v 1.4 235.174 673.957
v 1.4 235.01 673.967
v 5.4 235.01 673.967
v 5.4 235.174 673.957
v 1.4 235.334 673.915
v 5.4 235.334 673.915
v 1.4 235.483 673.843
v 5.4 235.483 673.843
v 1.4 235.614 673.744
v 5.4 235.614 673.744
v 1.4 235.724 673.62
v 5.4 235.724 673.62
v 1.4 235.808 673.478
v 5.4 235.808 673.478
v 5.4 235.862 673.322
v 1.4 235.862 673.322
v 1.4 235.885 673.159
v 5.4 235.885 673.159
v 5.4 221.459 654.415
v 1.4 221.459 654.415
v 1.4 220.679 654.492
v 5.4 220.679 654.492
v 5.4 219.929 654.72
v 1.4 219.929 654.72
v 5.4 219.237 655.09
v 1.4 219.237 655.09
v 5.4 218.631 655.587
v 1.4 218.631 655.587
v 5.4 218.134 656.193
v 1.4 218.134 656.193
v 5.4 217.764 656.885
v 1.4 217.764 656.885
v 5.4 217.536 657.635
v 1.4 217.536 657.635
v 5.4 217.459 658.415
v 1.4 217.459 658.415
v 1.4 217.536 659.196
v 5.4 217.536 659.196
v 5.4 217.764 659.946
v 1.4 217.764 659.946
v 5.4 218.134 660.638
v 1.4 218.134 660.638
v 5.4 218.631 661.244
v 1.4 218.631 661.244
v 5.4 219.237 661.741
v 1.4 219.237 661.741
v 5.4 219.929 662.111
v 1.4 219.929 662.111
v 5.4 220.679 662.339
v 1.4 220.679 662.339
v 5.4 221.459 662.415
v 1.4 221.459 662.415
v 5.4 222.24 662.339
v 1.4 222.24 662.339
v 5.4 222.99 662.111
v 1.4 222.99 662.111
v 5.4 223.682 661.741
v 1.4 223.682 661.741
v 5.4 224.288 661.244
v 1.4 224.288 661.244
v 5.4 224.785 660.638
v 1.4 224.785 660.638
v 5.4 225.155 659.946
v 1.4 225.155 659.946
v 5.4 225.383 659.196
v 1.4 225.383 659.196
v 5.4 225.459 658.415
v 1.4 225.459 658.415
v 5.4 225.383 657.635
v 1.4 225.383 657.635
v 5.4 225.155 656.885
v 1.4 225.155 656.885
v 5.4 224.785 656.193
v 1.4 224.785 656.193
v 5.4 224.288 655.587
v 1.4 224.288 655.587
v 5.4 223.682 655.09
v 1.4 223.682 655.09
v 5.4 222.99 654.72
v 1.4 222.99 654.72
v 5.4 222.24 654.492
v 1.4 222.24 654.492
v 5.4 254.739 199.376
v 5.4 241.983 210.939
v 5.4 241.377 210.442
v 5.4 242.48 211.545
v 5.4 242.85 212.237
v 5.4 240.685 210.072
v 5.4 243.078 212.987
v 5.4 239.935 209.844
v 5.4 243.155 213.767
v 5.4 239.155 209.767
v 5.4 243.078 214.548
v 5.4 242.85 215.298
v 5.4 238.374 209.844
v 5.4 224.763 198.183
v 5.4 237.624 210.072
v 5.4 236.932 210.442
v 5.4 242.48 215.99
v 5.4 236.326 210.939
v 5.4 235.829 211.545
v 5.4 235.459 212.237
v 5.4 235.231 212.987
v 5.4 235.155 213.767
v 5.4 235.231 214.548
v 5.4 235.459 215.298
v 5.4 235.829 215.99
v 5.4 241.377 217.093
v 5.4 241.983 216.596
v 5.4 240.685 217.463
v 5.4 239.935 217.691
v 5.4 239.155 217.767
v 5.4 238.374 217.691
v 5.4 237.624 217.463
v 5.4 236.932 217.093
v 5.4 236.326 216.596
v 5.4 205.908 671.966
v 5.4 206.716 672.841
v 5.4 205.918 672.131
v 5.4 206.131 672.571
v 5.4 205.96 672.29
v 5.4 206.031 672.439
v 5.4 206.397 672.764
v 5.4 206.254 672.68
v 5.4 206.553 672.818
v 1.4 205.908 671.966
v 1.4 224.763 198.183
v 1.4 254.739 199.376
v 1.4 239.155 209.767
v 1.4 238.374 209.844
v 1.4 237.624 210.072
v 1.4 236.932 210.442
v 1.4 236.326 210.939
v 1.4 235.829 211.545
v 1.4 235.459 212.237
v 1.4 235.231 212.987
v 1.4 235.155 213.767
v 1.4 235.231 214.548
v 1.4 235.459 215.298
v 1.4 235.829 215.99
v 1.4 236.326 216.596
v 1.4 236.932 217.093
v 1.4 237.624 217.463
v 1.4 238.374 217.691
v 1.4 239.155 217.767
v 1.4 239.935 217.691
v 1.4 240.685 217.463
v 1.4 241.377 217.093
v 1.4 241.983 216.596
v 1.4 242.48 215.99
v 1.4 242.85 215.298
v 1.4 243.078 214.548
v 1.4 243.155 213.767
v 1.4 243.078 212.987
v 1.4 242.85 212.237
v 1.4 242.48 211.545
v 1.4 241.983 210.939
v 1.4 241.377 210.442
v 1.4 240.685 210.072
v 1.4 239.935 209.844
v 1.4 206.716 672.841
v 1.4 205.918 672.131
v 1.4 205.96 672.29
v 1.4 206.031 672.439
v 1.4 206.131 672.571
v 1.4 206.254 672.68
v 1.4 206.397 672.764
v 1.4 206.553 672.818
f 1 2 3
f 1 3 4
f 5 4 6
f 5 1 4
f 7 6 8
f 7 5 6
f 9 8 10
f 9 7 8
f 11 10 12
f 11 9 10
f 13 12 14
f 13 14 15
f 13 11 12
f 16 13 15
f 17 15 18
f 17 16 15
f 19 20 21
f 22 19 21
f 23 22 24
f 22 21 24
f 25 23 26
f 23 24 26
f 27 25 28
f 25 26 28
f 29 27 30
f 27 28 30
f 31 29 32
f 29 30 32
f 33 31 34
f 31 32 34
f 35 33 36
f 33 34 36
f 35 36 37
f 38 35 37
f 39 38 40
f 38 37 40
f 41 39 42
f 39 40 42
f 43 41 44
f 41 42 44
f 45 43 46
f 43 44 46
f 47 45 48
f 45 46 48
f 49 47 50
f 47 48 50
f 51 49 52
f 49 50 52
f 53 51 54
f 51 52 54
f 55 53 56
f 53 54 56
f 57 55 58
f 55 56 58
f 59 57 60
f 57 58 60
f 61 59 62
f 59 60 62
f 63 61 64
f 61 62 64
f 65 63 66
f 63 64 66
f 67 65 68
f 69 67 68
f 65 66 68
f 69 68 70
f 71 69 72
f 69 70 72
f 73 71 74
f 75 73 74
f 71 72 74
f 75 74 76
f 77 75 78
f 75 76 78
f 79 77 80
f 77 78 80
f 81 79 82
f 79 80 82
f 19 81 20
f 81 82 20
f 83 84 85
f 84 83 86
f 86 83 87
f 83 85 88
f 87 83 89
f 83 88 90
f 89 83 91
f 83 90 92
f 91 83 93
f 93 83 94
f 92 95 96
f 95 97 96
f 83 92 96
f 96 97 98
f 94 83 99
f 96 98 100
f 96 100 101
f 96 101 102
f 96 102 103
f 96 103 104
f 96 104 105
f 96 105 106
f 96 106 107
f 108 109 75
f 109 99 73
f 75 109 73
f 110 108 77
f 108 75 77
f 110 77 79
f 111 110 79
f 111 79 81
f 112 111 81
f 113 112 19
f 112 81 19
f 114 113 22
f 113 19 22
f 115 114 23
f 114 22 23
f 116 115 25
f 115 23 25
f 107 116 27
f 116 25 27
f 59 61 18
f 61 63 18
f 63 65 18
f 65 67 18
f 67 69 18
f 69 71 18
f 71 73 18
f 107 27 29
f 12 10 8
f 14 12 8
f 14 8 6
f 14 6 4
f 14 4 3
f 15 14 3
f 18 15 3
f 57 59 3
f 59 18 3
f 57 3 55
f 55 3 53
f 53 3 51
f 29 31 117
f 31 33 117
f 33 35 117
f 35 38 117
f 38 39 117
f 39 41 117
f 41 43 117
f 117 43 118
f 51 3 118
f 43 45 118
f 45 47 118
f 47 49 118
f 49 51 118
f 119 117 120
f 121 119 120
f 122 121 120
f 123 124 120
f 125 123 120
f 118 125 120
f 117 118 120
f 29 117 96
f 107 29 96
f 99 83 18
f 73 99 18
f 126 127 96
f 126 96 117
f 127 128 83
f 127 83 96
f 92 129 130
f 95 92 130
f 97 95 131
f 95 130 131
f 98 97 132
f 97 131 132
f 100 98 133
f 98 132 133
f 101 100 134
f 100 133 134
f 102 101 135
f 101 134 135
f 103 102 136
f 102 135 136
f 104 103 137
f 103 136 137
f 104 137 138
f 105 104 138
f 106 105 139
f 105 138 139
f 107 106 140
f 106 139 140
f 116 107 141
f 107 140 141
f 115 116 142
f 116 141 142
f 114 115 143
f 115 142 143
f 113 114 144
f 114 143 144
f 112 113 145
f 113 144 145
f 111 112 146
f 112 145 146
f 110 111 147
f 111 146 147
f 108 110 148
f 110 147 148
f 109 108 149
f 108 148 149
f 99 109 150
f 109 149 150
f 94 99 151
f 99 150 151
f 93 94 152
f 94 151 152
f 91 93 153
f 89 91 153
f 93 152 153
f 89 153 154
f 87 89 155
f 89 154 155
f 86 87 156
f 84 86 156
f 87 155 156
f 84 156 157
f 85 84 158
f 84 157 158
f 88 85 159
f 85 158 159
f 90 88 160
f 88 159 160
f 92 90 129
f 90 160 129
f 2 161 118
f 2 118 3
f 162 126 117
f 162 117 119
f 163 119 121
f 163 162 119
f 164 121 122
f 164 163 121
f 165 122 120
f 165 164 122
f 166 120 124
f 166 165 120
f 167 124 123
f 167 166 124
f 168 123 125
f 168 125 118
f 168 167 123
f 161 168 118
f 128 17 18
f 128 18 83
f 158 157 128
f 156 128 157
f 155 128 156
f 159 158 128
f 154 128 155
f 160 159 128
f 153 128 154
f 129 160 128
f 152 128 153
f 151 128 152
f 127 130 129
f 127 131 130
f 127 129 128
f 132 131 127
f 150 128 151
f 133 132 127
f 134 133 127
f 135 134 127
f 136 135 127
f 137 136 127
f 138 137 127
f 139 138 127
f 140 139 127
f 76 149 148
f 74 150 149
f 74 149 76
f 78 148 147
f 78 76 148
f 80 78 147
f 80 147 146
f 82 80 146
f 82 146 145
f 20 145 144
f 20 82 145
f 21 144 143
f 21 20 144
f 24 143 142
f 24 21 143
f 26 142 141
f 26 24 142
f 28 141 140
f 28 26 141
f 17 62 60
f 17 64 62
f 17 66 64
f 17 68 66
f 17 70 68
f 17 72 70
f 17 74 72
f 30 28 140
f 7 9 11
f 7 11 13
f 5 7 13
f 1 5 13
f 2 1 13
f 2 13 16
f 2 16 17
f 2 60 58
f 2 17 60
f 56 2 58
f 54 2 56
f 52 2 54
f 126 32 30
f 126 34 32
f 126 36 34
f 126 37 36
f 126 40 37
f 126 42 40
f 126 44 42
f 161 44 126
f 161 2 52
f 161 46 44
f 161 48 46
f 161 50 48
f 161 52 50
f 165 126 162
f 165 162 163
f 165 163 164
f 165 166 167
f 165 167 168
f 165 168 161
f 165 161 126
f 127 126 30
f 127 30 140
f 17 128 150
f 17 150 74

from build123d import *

# Parameters (mm, degrees)
SKETCH1_R           = 4
BOSS_EXTRUDE1_DEPTH = 4


with BuildPart() as part:
    # Sketch1 → Boss-Extrude1 (new body)
    with BuildSketch(Plane(origin=(1.4, 0, 0), x_dir=(0, -1, 0), z_dir=(-1, 0, 0))):
        with BuildLine():
            Line((-254.739115199, 199.375774934), (-224.762842625, 198.182844675))
            Line((-224.762842625, 198.182844675), (-205.908265943, 671.965721187))
            ThreePointArc((-205.908265943, 671.965721187), (-206.131039779, 672.570516328), (-206.716219414, 672.840646182))
            Line((-206.716219414, 672.840646182), (-235.009613521, 673.966604918))
            ThreePointArc((-235.009613521, 673.966604918), (-235.614408661, 673.743831082), (-235.884538516, 673.158651447))
            Line((-235.884538516, 673.158651447), (-254.739115199, 199.375774934))
        make_face()
        with Locations(Location((-221.459381597, 658.415489264, 0), (0, 0, 270))):
            Circle(SKETCH1_R, mode=Mode.SUBTRACT)
        with Locations(Location((-239.154513782, 213.767446091, 0), (0, 0, 270))):
            Circle(SKETCH1_R, mode=Mode.SUBTRACT)
    extrude(amount=-BOSS_EXTRUDE1_DEPTH)


solid = part.part
